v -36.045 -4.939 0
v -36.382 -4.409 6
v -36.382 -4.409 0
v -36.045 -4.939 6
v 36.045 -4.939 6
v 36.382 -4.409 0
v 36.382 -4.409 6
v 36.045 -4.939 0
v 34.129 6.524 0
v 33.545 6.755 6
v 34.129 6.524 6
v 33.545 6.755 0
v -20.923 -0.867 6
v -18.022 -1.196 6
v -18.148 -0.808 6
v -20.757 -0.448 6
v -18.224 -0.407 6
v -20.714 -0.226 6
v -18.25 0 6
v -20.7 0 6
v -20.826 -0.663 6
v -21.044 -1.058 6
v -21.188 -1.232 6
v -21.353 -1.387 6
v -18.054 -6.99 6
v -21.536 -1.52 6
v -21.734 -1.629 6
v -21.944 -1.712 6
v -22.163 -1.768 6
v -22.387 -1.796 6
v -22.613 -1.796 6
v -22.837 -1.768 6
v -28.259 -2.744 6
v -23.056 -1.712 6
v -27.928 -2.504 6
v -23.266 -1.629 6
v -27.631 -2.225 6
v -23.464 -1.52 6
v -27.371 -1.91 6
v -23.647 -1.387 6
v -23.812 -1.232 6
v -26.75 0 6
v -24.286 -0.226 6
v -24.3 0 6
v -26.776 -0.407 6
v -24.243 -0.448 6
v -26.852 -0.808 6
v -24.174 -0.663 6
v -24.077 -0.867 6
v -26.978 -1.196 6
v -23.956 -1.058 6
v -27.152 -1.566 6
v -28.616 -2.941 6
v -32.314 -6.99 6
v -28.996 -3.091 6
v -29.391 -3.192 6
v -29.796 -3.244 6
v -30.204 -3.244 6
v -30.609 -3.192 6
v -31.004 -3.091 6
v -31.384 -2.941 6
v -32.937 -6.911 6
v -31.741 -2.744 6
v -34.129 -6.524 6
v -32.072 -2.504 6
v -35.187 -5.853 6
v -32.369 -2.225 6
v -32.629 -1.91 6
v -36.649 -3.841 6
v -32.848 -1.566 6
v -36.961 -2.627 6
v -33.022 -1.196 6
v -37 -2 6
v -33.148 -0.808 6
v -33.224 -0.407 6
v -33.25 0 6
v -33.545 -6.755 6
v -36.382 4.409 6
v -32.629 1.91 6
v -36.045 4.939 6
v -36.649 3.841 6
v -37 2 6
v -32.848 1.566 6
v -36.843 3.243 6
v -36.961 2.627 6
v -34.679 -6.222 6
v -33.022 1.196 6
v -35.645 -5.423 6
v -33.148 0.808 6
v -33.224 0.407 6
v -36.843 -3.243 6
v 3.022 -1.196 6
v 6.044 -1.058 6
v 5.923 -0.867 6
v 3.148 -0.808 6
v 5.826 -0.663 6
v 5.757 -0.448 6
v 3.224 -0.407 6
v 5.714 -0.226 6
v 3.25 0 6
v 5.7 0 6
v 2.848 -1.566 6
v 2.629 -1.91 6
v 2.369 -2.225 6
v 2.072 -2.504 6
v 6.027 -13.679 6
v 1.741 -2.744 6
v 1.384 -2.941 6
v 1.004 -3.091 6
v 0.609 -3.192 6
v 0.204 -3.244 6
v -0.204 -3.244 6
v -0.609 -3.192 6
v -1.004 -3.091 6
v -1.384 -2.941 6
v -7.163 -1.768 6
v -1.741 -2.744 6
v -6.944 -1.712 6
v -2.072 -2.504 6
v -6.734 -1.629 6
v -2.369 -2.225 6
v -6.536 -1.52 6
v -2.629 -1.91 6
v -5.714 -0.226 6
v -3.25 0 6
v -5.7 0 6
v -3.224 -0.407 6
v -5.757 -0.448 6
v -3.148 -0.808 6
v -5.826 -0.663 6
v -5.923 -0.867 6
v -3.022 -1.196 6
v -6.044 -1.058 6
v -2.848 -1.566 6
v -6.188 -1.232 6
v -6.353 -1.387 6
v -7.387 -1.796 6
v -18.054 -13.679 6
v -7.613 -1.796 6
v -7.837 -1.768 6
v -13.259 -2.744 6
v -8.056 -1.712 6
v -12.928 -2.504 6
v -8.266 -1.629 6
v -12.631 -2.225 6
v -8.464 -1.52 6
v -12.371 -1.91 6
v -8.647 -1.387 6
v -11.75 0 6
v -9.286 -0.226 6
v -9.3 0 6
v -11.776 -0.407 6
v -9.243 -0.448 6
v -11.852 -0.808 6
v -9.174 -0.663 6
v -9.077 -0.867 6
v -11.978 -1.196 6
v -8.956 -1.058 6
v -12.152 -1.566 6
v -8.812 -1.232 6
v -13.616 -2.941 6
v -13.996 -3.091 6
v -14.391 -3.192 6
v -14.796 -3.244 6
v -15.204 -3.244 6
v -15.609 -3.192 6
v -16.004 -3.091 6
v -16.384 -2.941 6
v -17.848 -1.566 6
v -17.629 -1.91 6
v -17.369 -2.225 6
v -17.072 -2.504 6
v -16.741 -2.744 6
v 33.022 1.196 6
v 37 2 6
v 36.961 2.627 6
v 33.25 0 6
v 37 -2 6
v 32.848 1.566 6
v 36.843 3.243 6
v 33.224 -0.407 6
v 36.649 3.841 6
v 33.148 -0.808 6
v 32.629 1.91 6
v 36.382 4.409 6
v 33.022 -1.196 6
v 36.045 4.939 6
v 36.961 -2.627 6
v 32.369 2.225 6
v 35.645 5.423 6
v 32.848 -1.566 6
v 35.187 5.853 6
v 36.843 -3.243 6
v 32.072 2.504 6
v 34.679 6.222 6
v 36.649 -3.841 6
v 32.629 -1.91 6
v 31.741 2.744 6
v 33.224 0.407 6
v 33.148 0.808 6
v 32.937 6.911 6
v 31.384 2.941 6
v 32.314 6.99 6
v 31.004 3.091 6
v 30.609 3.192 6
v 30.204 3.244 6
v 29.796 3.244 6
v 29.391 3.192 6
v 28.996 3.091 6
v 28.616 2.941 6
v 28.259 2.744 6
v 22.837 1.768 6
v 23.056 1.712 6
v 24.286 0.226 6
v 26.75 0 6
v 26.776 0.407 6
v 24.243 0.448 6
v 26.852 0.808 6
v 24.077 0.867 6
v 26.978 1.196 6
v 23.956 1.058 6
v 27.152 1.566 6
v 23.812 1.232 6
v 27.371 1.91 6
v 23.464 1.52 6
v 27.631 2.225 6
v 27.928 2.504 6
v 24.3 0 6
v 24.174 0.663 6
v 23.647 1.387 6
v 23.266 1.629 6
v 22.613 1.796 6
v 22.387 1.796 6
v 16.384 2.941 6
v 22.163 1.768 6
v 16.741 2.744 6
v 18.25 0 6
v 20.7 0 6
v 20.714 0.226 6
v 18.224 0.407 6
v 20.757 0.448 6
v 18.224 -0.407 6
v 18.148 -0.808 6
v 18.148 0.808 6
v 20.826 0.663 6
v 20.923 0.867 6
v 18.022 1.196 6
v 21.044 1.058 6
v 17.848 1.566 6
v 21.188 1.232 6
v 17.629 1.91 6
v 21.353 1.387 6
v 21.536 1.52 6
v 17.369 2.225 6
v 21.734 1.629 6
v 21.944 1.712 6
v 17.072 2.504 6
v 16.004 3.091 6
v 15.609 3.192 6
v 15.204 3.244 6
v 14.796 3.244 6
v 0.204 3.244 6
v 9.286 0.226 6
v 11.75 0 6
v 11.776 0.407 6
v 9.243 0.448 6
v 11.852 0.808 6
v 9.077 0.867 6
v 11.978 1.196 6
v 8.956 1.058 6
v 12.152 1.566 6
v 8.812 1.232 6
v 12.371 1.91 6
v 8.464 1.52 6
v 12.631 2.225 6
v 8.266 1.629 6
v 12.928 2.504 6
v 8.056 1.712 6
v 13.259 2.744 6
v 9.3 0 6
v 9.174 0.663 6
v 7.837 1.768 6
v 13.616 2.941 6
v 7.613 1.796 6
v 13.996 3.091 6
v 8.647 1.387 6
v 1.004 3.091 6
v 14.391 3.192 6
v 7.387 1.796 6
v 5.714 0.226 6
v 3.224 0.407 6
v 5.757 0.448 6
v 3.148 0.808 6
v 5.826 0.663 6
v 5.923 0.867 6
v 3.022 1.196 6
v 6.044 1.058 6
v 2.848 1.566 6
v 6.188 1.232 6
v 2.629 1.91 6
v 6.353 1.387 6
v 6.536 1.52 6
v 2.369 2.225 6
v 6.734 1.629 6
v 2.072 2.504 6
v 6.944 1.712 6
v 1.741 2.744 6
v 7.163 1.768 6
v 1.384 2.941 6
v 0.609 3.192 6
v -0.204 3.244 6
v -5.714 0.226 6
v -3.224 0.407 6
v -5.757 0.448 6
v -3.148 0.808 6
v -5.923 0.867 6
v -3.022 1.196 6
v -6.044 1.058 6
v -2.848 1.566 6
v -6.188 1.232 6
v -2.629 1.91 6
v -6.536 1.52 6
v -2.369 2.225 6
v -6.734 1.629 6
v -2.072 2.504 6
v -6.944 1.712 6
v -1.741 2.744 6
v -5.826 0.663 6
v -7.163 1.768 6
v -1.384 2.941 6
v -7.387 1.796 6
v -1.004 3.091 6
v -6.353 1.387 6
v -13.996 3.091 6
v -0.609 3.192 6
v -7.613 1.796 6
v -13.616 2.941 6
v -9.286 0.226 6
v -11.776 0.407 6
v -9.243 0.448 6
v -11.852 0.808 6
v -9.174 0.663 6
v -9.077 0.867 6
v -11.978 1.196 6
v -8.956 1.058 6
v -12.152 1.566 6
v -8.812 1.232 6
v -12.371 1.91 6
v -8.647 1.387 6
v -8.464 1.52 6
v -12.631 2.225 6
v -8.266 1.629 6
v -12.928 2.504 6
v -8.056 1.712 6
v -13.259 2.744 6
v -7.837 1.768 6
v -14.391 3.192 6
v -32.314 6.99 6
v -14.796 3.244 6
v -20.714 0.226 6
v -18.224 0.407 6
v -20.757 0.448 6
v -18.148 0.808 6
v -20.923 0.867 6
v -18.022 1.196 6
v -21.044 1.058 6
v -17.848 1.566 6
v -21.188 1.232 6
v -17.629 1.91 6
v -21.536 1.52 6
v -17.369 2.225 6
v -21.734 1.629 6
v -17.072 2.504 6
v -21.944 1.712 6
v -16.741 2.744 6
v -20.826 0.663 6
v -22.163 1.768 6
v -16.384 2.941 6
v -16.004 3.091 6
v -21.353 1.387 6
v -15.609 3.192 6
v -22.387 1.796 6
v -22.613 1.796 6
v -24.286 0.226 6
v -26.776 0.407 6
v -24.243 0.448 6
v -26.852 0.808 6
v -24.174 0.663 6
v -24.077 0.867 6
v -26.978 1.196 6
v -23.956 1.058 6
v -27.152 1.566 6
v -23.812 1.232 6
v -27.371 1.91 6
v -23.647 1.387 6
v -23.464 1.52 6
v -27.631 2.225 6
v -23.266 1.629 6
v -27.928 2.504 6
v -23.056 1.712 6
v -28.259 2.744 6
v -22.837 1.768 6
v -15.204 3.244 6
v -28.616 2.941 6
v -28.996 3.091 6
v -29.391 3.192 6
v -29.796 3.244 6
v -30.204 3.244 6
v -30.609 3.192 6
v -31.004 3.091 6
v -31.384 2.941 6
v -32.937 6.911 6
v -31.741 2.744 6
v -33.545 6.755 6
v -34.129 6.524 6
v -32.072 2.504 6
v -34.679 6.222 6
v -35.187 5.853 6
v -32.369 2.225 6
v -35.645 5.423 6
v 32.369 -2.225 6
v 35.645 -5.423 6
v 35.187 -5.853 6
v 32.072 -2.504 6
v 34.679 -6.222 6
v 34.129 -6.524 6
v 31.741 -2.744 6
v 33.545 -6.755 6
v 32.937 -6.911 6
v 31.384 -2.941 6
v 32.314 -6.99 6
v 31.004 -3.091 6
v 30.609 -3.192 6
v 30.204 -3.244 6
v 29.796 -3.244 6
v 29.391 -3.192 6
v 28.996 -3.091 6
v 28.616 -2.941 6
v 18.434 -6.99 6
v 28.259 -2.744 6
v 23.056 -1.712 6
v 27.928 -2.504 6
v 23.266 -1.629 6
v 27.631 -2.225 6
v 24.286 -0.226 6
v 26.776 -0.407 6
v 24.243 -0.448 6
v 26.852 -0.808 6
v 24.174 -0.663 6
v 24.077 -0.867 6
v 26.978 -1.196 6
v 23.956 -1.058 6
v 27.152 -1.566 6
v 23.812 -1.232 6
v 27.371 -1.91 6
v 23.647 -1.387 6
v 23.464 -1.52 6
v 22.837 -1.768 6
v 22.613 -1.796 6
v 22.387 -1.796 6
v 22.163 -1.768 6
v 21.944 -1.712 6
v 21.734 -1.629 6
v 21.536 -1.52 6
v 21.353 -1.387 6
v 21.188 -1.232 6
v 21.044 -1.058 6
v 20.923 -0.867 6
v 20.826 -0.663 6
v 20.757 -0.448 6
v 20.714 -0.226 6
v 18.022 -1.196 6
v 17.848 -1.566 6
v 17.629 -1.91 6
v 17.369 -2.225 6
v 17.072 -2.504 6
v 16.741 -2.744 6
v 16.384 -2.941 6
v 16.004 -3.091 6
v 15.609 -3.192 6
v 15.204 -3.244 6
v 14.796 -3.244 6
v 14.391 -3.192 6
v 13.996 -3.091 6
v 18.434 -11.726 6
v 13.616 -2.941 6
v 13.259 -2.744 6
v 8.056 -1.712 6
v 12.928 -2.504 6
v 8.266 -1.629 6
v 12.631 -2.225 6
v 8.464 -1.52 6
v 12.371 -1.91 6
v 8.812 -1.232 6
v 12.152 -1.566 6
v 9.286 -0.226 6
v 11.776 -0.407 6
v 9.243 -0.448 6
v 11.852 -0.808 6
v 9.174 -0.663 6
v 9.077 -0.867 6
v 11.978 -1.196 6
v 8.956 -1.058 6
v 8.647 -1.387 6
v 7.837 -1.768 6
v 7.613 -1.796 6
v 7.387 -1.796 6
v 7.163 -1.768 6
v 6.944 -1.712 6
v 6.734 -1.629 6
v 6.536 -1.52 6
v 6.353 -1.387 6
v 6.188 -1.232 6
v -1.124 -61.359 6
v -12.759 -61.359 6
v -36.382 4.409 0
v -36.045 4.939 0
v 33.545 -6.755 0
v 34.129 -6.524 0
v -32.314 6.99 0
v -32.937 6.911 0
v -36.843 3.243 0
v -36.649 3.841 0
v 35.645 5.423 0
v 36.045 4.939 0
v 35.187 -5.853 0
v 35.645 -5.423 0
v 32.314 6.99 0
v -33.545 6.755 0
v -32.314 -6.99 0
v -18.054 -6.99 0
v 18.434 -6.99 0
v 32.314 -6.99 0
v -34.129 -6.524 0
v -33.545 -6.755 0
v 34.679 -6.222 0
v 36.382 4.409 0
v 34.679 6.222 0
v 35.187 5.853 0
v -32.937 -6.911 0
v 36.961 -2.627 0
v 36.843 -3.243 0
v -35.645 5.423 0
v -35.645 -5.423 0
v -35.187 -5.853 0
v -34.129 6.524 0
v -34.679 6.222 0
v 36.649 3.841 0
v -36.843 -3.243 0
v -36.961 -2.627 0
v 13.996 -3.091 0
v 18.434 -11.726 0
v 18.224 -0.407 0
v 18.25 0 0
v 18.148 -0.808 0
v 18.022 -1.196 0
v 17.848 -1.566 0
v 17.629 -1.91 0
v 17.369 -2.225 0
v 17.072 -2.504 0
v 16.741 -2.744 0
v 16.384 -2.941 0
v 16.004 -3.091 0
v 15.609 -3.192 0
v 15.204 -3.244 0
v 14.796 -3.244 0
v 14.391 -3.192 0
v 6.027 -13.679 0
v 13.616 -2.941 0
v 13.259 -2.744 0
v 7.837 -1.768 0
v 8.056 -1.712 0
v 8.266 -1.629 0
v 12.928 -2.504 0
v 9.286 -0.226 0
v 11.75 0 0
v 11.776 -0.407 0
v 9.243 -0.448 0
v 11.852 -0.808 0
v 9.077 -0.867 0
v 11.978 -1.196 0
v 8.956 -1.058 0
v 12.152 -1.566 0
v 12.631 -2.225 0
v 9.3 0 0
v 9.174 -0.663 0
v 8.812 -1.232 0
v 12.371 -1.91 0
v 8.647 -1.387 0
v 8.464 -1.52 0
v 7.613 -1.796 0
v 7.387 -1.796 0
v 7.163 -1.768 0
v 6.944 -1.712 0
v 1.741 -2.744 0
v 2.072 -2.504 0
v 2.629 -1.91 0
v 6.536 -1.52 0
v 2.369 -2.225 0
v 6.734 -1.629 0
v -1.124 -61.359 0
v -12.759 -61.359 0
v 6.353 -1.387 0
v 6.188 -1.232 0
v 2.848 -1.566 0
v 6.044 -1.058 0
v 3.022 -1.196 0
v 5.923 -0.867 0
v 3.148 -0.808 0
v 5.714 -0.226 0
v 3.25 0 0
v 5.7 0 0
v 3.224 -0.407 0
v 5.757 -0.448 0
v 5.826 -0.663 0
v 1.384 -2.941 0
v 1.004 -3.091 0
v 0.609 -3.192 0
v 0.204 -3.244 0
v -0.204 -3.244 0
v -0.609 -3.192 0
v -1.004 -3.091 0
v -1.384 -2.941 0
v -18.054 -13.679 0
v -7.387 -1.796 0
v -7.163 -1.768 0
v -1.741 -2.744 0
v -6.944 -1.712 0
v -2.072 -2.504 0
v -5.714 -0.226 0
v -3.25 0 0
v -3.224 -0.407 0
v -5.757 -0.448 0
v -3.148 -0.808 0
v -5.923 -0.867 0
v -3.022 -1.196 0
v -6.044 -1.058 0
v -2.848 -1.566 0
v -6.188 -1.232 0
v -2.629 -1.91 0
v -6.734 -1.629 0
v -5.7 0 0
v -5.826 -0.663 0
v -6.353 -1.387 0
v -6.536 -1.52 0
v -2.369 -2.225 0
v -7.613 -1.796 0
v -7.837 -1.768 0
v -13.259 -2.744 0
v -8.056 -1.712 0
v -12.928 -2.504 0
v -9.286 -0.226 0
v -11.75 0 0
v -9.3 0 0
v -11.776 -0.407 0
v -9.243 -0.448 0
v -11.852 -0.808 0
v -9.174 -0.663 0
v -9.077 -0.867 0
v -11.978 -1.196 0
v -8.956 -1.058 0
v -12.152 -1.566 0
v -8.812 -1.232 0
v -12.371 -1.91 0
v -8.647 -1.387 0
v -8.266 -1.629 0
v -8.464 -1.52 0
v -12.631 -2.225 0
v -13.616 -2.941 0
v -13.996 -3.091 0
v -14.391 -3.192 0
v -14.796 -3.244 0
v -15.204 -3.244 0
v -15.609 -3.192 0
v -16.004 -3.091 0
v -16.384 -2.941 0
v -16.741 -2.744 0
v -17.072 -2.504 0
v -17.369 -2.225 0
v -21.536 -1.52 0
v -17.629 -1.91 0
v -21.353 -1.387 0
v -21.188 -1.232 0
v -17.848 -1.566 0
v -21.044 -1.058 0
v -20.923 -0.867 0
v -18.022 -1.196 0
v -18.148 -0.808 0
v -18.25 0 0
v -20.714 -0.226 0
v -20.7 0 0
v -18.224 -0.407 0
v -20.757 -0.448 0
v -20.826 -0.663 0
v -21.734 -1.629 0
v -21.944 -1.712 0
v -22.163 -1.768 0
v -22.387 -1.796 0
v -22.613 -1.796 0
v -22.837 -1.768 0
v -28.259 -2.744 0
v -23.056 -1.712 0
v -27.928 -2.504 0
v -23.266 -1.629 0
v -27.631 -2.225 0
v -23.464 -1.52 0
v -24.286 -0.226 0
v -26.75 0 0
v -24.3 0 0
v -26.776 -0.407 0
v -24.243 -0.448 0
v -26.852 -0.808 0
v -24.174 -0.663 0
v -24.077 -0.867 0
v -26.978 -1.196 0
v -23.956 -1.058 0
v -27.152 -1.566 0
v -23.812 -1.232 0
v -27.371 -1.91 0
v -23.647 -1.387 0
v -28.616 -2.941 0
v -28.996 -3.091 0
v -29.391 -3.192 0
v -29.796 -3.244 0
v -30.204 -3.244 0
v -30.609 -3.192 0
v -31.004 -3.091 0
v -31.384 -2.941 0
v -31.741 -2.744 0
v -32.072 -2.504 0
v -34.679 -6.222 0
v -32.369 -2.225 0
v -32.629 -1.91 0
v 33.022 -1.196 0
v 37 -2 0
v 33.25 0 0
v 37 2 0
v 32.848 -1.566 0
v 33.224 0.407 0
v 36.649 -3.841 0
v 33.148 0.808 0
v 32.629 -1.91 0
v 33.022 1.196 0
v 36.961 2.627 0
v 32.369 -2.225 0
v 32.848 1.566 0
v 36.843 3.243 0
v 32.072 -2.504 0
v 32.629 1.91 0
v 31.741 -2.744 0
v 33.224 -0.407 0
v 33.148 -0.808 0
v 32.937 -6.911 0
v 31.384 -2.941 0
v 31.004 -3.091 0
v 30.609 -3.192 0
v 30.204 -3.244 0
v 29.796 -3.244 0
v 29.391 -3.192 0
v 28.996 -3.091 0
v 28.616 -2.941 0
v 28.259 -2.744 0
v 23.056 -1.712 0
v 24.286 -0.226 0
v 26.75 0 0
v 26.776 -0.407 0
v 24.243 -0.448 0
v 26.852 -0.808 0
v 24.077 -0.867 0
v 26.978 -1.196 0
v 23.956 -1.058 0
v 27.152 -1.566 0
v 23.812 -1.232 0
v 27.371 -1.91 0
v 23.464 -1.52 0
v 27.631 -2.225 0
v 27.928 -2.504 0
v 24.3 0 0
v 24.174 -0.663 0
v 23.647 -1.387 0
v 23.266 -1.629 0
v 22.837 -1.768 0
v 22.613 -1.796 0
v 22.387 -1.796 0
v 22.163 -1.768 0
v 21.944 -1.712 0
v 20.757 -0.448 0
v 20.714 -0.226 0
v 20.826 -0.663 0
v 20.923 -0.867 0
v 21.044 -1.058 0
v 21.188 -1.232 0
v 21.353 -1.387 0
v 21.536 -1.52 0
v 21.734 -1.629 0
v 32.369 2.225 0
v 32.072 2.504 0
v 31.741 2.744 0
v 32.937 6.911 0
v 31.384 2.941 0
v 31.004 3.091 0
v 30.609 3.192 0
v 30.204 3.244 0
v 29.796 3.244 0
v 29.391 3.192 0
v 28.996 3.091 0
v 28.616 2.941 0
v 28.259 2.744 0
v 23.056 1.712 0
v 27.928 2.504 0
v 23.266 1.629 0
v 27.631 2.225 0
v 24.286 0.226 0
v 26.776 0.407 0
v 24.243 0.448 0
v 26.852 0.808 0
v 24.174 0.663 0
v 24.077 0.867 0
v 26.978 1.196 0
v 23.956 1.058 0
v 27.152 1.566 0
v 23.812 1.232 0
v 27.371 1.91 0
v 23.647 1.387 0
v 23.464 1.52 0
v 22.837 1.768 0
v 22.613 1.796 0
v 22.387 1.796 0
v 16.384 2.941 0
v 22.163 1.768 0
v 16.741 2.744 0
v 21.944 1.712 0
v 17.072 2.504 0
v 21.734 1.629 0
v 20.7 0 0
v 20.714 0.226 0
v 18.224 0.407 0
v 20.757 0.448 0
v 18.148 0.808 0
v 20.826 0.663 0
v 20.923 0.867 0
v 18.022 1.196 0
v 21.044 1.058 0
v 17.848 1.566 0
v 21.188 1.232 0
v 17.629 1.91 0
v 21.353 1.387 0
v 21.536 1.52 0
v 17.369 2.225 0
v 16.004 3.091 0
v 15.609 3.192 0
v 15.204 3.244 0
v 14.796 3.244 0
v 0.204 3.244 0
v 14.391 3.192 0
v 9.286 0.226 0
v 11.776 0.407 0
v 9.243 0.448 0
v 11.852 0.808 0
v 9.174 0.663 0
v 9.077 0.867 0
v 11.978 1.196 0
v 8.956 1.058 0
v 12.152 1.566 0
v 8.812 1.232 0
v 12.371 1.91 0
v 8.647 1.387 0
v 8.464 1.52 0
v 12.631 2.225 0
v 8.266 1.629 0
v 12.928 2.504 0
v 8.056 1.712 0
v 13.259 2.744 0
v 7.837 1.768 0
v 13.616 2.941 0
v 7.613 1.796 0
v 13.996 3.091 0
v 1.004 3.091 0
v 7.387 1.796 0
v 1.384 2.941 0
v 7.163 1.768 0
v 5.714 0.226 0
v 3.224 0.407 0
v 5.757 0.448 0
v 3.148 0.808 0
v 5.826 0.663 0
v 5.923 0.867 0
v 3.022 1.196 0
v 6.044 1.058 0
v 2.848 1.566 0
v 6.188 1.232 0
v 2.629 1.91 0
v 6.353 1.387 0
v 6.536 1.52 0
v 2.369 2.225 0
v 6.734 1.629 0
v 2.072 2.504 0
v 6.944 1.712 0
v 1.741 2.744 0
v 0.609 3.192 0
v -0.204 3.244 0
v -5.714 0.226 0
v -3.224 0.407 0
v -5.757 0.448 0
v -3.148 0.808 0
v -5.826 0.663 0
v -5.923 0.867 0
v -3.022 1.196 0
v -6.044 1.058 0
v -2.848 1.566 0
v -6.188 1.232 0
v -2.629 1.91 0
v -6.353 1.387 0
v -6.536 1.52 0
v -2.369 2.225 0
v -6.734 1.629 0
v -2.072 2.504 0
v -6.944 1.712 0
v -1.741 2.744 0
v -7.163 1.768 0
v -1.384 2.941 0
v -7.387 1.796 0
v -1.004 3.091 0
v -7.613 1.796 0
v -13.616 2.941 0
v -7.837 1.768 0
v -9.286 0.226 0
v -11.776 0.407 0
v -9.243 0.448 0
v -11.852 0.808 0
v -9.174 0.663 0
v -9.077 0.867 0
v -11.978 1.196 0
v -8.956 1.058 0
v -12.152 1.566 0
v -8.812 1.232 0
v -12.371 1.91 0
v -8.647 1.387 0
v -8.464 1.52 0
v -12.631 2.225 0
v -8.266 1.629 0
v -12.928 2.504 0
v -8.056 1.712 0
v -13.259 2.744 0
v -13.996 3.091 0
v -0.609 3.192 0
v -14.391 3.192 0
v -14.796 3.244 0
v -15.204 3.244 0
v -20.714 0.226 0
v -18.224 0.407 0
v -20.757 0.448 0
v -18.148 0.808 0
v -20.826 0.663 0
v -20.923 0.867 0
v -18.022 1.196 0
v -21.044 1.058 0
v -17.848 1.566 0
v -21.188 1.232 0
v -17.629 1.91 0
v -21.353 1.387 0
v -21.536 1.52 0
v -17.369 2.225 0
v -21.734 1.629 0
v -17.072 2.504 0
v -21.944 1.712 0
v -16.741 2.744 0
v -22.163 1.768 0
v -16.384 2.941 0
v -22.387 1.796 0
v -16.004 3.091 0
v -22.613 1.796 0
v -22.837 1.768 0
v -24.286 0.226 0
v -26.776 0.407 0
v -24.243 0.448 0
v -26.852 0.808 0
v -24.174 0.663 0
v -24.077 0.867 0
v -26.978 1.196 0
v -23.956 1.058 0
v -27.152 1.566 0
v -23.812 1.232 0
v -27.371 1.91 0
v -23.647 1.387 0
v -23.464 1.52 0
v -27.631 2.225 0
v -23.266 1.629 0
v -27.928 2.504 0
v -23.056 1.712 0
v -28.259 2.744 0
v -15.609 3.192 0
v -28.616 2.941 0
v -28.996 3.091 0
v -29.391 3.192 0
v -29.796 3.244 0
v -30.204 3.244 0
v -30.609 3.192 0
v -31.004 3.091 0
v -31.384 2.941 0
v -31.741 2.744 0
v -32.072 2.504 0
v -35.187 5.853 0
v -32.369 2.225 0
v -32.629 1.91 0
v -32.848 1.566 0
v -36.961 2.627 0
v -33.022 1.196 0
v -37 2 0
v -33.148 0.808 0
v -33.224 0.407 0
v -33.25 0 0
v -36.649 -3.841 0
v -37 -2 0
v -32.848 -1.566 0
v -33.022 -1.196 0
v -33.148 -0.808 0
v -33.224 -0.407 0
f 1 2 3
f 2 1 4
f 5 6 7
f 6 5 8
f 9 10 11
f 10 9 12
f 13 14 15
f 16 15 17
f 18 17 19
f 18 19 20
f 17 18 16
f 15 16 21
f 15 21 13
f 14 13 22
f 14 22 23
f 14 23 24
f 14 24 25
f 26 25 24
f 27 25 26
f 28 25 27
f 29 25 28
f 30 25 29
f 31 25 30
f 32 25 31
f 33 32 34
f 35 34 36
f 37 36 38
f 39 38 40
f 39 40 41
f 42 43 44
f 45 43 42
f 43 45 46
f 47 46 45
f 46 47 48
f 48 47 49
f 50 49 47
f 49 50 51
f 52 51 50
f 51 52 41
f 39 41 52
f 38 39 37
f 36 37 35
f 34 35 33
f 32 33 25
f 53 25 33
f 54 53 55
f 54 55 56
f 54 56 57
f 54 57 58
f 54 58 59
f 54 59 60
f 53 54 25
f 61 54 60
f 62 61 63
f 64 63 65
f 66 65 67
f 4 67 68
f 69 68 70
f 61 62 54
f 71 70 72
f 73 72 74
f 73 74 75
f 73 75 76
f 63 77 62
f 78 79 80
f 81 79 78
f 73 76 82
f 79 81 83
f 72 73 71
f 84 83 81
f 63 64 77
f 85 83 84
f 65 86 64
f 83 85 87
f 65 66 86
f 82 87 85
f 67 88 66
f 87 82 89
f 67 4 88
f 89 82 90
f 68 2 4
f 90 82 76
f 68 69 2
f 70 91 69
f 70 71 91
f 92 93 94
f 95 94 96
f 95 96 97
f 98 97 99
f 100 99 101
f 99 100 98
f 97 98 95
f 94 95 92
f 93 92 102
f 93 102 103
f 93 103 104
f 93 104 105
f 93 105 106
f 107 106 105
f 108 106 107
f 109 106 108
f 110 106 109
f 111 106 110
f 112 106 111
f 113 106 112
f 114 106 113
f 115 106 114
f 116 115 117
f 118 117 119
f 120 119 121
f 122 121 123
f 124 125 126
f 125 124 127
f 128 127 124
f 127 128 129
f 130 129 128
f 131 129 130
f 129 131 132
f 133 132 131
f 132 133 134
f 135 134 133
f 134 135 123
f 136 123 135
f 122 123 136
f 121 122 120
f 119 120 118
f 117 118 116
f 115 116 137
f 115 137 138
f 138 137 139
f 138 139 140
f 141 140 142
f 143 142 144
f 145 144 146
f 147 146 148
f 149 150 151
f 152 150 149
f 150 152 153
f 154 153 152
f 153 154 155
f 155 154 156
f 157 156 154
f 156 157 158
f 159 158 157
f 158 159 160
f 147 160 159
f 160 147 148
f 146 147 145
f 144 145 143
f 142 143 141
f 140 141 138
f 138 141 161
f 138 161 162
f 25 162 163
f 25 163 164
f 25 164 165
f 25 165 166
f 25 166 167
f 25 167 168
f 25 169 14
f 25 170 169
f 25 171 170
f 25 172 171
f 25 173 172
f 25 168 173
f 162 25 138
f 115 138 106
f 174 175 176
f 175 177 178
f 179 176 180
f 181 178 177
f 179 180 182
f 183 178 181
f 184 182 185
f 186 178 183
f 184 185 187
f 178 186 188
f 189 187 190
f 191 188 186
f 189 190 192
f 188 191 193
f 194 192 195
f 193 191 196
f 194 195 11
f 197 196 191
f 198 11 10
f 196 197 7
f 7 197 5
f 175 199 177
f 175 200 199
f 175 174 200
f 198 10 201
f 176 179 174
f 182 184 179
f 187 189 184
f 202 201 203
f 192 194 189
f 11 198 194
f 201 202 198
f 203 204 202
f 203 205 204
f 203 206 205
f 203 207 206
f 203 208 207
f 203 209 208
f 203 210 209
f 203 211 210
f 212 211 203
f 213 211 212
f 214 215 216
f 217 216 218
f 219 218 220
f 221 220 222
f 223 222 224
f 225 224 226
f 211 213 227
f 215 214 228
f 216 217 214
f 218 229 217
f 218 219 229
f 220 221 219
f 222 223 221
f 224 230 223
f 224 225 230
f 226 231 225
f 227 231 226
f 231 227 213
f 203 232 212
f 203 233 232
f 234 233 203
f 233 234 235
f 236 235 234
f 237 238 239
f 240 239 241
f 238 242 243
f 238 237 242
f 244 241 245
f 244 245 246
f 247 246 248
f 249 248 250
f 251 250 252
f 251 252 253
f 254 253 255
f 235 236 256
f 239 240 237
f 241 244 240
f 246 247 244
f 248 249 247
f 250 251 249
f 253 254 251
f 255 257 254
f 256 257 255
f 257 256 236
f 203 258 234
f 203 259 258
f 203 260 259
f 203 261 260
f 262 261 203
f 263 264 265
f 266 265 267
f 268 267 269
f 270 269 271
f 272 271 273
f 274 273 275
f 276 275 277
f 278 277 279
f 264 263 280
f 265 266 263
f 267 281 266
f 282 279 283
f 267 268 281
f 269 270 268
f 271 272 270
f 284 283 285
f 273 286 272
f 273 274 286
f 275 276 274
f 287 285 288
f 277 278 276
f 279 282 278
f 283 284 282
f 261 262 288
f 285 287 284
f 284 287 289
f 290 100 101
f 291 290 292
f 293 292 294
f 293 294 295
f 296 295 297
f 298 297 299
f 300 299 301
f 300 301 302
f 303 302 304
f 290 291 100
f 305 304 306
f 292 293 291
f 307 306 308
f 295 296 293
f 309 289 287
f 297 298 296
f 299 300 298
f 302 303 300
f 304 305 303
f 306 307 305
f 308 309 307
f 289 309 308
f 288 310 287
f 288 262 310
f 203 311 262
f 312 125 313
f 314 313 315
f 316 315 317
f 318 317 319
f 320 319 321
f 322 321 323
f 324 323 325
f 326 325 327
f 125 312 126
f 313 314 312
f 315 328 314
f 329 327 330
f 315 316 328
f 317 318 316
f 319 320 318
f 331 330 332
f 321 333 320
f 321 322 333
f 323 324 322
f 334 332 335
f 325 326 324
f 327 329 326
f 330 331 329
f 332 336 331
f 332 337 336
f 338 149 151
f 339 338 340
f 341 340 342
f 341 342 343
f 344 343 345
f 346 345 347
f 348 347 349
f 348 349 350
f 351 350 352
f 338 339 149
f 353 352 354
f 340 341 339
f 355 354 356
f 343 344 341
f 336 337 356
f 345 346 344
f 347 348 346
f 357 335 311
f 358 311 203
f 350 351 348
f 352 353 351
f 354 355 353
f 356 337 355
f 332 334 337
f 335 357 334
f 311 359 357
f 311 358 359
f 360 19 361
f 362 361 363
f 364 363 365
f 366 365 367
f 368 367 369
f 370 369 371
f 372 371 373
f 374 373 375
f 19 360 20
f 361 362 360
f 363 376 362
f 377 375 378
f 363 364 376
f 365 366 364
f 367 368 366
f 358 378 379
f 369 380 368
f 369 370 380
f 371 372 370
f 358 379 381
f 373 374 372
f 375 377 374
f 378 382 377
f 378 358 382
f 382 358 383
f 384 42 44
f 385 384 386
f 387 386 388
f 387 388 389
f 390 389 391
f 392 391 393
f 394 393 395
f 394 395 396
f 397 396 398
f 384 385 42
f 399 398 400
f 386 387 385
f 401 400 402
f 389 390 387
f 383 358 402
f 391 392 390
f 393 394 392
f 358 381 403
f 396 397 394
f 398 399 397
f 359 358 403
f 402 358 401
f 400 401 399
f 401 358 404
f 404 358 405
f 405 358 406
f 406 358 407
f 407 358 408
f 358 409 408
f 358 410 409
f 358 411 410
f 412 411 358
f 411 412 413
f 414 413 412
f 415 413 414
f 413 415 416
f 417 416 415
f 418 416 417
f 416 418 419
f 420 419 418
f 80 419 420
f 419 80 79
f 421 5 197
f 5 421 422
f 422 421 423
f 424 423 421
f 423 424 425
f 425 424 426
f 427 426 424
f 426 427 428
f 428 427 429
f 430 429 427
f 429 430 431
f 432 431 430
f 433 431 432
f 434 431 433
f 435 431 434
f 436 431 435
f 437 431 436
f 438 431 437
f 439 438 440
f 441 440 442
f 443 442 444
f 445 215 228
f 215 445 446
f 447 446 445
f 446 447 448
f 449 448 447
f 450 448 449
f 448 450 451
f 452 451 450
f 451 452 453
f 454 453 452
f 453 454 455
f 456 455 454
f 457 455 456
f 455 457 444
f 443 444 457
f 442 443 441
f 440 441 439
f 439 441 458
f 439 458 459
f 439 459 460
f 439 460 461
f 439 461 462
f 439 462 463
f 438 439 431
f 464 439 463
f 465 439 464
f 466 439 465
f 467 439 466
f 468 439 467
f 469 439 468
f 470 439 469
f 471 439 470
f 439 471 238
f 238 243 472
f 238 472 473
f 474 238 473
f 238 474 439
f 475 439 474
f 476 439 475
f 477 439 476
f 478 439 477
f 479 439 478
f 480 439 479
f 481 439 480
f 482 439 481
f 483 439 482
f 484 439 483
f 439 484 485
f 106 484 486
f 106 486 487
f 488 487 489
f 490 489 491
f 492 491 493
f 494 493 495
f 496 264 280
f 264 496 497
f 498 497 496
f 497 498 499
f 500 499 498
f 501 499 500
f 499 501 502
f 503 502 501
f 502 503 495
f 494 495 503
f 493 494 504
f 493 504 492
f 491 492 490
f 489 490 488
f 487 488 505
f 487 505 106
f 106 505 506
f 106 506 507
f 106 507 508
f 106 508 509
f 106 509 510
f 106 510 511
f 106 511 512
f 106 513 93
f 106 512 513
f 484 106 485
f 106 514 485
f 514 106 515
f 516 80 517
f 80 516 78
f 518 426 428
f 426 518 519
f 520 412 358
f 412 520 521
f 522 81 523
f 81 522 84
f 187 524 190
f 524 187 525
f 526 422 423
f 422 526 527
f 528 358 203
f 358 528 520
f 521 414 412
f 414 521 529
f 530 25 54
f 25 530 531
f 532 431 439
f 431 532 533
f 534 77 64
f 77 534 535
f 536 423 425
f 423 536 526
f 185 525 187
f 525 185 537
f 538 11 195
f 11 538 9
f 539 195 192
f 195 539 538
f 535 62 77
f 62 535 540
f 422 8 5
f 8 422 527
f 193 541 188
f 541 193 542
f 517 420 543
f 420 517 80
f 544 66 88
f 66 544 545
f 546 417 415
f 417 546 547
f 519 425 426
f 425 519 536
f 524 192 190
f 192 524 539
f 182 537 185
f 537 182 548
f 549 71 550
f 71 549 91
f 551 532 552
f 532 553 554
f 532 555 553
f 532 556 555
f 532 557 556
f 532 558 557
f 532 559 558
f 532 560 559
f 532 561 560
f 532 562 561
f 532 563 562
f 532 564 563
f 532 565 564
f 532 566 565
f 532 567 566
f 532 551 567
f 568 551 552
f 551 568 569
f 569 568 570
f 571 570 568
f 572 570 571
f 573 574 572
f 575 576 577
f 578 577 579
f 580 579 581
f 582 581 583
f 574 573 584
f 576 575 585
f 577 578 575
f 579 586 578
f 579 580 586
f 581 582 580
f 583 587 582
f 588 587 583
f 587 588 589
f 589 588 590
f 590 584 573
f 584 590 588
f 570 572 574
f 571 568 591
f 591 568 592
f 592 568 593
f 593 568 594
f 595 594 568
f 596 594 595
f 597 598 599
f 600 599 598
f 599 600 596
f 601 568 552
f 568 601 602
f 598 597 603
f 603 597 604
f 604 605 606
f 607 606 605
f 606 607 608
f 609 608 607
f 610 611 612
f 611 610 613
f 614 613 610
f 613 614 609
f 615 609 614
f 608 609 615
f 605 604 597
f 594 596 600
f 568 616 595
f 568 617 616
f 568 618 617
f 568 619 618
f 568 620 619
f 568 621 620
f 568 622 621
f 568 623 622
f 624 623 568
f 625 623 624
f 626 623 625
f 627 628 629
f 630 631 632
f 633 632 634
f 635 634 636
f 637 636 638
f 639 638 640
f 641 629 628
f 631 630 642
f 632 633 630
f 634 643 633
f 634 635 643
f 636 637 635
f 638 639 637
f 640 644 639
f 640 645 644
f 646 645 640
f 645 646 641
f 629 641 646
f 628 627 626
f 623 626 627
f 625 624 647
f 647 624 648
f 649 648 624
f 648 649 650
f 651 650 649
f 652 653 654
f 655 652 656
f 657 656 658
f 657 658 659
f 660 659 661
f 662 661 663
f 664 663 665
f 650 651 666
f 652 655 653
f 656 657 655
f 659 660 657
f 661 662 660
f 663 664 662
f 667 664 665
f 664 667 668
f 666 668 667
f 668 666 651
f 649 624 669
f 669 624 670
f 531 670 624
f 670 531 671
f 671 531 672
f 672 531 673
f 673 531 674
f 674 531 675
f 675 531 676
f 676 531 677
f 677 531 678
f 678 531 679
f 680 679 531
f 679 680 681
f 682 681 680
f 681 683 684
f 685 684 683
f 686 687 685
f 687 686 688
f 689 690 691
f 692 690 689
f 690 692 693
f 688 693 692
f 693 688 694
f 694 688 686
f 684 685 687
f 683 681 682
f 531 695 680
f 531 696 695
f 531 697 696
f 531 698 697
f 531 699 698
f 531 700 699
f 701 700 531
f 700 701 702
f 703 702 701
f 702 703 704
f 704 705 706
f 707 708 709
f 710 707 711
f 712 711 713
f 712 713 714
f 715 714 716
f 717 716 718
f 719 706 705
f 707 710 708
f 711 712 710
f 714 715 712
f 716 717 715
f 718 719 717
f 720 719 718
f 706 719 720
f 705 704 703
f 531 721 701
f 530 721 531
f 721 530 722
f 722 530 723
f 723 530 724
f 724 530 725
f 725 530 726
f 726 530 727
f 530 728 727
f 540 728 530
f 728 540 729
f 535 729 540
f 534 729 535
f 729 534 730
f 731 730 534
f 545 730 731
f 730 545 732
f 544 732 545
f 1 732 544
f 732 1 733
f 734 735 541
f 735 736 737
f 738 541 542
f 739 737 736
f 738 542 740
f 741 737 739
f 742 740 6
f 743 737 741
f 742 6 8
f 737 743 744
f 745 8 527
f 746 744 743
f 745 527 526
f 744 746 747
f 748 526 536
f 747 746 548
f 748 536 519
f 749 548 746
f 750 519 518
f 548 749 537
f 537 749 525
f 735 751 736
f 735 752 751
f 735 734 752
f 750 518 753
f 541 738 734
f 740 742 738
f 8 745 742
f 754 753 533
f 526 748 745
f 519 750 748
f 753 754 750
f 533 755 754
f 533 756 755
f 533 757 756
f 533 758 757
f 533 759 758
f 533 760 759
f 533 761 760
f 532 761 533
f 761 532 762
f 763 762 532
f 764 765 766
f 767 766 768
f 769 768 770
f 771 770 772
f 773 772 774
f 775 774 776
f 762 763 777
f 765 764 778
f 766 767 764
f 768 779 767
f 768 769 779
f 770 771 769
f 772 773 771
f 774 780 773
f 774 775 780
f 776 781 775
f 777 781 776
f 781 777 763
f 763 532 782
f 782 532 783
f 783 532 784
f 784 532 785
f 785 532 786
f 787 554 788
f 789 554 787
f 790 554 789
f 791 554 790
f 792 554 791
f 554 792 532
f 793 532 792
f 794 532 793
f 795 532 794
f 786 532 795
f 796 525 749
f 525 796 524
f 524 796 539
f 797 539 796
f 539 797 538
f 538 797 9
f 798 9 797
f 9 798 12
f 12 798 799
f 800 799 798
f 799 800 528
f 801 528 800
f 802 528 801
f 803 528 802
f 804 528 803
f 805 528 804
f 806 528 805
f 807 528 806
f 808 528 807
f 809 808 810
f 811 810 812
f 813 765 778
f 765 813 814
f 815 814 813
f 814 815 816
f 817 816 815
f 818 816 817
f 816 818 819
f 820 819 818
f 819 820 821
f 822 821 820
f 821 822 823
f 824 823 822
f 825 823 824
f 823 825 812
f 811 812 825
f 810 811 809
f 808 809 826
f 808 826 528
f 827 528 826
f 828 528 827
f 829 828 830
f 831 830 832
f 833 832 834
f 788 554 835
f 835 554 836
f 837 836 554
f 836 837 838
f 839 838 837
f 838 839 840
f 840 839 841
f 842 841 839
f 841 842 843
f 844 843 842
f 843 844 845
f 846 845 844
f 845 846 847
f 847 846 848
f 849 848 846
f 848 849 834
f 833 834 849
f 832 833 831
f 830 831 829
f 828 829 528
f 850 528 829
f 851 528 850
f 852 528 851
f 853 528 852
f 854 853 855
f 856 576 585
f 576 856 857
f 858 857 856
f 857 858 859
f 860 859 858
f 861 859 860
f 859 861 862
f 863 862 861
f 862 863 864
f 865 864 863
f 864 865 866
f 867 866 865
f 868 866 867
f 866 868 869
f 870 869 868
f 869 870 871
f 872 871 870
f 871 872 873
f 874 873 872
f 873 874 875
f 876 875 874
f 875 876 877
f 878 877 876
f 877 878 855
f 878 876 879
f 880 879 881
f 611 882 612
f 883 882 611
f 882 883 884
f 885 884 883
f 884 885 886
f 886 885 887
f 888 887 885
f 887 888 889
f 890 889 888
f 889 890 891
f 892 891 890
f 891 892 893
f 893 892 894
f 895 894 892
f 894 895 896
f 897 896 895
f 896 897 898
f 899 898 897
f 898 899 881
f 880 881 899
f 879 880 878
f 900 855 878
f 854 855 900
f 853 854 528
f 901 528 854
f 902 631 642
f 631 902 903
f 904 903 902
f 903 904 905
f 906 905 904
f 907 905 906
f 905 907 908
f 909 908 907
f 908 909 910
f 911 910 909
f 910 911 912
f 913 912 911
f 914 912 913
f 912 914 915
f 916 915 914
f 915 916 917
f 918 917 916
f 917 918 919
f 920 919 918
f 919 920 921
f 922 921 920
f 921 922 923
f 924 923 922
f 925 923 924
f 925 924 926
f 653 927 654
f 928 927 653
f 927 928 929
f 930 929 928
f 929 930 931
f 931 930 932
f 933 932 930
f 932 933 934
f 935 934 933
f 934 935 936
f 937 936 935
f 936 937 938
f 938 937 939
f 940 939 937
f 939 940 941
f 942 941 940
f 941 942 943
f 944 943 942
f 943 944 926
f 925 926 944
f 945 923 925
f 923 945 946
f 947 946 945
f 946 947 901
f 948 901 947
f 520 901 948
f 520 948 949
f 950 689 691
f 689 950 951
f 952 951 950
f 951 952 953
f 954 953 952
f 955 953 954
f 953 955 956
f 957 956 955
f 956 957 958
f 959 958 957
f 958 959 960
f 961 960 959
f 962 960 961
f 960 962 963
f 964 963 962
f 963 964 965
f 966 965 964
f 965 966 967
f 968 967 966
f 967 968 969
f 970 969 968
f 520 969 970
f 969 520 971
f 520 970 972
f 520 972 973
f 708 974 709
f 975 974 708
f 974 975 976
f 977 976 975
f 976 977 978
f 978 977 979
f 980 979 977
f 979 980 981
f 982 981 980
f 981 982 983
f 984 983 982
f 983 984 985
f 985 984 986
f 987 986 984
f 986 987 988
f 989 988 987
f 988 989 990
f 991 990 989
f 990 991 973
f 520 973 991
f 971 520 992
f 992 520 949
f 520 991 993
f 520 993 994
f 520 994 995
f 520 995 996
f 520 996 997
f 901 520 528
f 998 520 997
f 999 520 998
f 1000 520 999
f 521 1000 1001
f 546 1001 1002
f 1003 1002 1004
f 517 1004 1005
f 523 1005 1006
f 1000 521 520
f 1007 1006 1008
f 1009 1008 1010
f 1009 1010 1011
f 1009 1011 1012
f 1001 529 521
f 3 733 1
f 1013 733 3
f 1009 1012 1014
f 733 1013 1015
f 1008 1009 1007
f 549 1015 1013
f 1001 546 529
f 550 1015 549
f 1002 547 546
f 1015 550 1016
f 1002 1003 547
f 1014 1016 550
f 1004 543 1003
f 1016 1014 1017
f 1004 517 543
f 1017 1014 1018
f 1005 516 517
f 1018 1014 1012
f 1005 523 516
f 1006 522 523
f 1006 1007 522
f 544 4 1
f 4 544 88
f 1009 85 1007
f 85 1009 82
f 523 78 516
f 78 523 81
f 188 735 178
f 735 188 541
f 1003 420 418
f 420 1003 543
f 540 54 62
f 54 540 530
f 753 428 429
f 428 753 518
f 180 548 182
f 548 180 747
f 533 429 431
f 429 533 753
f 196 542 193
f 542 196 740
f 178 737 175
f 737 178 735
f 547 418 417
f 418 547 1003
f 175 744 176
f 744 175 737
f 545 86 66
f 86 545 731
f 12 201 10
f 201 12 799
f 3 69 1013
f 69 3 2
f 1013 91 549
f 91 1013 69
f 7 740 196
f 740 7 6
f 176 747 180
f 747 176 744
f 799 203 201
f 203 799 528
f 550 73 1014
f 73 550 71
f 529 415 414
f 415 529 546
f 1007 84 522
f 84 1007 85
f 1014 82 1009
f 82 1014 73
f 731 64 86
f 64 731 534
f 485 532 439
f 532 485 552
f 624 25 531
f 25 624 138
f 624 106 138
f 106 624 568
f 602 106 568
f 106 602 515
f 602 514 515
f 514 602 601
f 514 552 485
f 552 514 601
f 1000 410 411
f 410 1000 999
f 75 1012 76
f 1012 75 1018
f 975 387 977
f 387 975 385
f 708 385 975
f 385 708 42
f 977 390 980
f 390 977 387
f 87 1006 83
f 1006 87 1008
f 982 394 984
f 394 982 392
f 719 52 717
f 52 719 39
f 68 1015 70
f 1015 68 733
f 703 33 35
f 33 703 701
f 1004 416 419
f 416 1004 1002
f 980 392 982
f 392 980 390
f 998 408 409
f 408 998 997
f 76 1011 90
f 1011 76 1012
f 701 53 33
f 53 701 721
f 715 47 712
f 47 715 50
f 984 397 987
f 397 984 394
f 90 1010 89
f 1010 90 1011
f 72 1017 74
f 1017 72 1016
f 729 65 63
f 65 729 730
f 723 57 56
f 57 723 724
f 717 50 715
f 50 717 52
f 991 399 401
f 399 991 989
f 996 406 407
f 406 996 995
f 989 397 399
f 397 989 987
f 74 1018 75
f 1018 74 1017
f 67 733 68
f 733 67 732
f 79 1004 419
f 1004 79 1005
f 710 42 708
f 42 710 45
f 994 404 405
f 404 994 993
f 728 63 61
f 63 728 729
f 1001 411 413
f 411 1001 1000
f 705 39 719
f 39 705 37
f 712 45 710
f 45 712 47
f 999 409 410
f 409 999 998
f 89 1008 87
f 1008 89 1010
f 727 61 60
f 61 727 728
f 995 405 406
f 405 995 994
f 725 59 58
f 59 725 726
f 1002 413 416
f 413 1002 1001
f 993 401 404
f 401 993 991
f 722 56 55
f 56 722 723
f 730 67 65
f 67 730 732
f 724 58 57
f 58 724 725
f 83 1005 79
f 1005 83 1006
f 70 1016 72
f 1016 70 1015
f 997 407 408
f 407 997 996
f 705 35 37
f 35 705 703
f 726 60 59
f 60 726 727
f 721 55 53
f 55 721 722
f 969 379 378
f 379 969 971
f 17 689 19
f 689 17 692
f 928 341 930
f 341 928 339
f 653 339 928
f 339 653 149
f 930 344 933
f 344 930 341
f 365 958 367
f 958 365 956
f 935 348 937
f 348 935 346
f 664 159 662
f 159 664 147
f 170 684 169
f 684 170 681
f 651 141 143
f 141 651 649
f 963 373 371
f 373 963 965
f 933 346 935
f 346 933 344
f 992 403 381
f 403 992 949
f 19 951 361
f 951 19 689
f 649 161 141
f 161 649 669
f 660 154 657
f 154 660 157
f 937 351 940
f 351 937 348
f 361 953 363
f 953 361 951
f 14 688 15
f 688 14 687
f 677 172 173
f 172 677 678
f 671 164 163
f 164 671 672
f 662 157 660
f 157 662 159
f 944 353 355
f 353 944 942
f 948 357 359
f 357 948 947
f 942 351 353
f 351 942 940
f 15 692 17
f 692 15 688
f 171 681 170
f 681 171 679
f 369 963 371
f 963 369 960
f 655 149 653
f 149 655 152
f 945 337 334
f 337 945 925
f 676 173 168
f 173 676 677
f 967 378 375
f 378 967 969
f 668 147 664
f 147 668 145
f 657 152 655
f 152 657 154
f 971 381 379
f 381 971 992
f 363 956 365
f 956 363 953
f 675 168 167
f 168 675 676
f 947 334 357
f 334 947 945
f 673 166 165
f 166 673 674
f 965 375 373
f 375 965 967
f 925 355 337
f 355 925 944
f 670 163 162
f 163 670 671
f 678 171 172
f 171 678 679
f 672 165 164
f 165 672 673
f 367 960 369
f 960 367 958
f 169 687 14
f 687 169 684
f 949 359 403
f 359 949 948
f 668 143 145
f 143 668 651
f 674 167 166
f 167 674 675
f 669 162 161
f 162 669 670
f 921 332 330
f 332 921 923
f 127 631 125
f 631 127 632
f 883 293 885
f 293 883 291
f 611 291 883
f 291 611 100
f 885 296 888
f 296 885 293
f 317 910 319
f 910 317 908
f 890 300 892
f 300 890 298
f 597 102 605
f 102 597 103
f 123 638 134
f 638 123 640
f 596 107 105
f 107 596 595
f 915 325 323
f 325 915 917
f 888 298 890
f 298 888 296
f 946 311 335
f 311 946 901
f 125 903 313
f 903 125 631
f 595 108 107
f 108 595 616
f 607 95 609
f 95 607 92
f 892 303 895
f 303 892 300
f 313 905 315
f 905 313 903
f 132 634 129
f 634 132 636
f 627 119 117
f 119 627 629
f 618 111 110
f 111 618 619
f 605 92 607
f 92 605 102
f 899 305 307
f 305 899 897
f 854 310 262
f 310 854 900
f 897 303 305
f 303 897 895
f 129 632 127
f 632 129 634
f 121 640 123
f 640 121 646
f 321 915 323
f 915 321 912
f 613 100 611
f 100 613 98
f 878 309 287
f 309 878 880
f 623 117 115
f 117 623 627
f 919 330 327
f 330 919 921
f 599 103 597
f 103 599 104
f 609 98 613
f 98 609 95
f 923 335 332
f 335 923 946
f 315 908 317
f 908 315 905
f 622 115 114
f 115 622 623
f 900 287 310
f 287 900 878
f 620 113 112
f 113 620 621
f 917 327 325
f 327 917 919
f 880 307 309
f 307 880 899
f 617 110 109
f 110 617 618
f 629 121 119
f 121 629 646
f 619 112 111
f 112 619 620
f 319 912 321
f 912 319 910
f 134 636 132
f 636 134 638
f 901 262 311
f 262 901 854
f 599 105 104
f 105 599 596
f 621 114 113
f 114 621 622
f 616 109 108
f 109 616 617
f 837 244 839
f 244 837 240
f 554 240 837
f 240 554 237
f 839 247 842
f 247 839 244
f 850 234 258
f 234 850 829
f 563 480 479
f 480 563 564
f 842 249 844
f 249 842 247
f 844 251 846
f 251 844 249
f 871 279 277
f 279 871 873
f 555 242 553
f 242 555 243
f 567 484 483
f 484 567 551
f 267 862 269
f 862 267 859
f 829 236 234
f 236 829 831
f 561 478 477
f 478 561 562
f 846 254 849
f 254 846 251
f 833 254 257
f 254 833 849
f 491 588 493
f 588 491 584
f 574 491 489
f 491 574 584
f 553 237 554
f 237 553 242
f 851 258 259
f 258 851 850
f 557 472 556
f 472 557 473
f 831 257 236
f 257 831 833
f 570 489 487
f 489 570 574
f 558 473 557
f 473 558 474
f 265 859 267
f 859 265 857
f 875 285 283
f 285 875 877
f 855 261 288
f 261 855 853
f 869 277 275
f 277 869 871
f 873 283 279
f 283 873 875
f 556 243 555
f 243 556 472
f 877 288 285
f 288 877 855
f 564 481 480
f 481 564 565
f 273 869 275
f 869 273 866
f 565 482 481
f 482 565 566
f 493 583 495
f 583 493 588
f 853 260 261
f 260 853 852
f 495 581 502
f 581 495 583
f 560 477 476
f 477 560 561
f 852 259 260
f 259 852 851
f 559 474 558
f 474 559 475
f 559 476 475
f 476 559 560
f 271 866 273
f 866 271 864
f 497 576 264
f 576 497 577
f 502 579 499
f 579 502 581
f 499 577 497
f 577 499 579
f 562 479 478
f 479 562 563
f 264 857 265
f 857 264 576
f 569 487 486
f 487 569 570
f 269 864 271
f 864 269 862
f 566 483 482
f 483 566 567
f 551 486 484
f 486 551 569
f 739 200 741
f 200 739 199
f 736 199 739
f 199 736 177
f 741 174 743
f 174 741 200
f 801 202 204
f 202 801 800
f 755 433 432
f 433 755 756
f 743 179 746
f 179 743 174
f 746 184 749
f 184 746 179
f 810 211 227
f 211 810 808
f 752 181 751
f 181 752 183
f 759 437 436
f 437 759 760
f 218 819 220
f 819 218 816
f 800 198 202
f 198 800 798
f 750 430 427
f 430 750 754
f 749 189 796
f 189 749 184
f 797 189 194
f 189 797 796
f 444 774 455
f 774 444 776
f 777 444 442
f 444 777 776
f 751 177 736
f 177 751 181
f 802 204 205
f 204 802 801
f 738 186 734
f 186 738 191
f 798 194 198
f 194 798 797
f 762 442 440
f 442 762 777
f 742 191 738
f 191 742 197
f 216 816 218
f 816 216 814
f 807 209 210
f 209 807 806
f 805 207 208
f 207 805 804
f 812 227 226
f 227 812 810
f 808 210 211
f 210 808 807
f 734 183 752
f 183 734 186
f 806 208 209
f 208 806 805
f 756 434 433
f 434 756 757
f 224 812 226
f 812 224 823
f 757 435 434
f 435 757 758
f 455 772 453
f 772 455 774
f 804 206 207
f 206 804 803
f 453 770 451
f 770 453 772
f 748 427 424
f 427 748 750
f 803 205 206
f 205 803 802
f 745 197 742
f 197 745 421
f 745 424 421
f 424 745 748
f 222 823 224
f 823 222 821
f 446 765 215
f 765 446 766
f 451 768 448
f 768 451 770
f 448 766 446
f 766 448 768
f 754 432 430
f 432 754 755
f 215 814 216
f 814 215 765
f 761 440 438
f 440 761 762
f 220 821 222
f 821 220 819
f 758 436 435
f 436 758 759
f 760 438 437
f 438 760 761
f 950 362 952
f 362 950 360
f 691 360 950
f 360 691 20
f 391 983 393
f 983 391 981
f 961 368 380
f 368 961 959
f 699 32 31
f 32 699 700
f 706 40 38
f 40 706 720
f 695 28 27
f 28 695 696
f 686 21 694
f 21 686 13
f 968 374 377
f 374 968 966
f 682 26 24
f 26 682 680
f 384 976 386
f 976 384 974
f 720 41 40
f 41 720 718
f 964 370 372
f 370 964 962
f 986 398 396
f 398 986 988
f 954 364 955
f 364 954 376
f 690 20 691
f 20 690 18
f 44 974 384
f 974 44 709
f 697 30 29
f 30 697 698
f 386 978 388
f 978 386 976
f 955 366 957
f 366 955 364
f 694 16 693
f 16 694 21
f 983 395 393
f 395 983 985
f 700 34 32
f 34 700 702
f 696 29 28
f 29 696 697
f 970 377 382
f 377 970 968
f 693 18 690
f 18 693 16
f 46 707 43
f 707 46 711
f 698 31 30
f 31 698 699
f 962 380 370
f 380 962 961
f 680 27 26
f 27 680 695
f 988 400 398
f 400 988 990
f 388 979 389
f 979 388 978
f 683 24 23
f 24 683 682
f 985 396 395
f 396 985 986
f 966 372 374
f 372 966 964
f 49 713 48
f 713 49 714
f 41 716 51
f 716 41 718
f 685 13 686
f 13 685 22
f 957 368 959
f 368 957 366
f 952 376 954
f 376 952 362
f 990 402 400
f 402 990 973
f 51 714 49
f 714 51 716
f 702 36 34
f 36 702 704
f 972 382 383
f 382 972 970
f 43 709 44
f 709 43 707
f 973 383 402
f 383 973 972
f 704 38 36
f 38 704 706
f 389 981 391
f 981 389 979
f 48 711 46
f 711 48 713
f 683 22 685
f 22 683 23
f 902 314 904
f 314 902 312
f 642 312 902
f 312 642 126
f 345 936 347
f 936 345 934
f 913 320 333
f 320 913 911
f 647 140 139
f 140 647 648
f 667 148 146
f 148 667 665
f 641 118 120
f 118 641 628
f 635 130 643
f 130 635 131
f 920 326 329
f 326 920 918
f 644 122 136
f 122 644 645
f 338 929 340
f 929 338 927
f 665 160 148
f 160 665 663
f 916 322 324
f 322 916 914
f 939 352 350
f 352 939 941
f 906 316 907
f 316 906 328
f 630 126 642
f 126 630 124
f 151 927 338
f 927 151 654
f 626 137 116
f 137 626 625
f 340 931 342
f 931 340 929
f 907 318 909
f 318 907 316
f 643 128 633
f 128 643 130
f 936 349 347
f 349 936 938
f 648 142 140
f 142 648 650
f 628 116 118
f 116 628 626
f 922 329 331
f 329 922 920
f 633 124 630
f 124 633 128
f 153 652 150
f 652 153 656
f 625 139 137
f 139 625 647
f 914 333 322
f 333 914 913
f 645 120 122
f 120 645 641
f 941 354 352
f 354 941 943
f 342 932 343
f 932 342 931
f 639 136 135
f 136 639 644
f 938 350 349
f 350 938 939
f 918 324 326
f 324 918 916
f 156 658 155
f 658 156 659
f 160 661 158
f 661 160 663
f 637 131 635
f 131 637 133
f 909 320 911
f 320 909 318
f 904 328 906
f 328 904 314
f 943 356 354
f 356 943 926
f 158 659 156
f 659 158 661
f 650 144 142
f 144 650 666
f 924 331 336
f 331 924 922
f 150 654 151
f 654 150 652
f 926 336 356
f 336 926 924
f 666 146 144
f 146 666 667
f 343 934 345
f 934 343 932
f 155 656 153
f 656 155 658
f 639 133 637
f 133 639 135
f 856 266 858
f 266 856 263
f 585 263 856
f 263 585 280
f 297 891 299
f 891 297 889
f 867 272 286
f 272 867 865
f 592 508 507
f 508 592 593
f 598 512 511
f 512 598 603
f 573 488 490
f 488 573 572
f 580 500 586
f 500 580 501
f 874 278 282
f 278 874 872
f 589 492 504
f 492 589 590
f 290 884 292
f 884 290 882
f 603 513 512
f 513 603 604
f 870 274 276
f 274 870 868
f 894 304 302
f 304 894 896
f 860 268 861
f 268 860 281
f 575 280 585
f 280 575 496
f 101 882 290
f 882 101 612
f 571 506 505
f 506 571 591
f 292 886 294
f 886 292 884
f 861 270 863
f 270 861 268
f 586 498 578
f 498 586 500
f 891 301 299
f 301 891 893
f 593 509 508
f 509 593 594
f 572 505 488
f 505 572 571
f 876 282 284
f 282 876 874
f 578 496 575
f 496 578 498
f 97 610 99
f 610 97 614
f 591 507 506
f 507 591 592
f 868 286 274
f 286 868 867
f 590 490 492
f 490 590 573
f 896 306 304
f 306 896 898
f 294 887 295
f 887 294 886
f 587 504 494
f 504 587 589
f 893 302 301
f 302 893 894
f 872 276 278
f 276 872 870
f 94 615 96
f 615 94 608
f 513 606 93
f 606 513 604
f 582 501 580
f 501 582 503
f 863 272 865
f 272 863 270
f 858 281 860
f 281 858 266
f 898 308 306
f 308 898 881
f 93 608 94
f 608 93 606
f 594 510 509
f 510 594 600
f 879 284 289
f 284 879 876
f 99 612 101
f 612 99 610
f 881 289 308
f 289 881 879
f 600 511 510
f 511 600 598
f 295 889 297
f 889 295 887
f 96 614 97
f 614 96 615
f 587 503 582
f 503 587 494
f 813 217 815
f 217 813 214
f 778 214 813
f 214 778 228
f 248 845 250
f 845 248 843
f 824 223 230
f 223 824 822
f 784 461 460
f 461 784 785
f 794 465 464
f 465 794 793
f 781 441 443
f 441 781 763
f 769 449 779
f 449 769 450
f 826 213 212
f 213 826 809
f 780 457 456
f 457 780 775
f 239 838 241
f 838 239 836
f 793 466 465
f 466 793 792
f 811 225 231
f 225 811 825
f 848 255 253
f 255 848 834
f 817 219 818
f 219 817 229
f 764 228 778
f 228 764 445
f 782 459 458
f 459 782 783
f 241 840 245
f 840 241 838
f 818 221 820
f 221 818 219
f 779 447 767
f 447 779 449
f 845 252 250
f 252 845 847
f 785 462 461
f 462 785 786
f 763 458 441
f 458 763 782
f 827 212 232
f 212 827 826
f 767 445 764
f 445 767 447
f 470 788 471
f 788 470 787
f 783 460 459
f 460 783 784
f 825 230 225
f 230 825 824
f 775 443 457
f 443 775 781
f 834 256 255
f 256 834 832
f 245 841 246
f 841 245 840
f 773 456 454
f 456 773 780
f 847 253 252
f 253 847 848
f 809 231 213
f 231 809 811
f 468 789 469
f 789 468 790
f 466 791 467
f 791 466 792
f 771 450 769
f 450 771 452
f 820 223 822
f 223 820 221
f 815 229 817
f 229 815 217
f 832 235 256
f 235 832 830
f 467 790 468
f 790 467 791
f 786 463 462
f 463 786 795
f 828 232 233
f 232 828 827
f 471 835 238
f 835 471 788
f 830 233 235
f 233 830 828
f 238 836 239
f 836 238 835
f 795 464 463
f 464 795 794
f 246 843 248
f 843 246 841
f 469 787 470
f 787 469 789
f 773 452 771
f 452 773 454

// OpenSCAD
$fn = 50;


difference() {
	union() {
		hull() {
			translate(v = [-32.0000000000, 2.0000000000, 0]) {
				cylinder(h = 6, r = 5);
			}
			translate(v = [32.0000000000, 2.0000000000, 0]) {
				cylinder(h = 6, r = 5);
			}
			translate(v = [-32.0000000000, -2.0000000000, 0]) {
				cylinder(h = 6, r = 5);
			}
			translate(v = [32.0000000000, -2.0000000000, 0]) {
				cylinder(h = 6, r = 5);
			}
		}
		translate(v = [0, -5, 0]) {
			linear_extrude(height = 6) {
				text(font = "DejaVu Sans Mono:style=Bold", halign = "center", size = 57.0000000000, text = "7", valign = "top");
			}
		}
	}
	union() {
		translate(v = [-30.0000000000, 0.0000000000, 0]) {
			translate(v = [0, 0, -100]) {
				cylinder(h = 200, r = 3.2500000000);
			}
		}
		translate(v = [-15.0000000000, 0.0000000000, 0]) {
			translate(v = [0, 0, -100]) {
				cylinder(h = 200, r = 3.2500000000);
			}
		}
		translate(v = [0, 0, -100]) {
			cylinder(h = 200, r = 3.2500000000);
		}
		translate(v = [15.0000000000, 0.0000000000, 0]) {
			translate(v = [0, 0, -100]) {
				cylinder(h = 200, r = 3.2500000000);
			}
		}
		translate(v = [30.0000000000, 0.0000000000, 0]) {
			translate(v = [0, 0, -100]) {
				cylinder(h = 200, r = 3.2500000000);
			}
		}
		translate(v = [-30.0000000000, 0.0000000000, 0]) {
			translate(v = [0, 0, -100]) {
				cylinder(h = 200, r = 1.8000000000);
			}
		}
		translate(v = [-22.5000000000, 0.0000000000, 0]) {
			translate(v = [0, 0, -100]) {
				cylinder(h = 200, r = 1.8000000000);
			}
		}
		translate(v = [-15.0000000000, 0.0000000000, 0]) {
			translate(v = [0, 0, -100]) {
				cylinder(h = 200, r = 1.8000000000);
			}
		}
		translate(v = [-7.5000000000, 0.0000000000, 0]) {
			translate(v = [0, 0, -100]) {
				cylinder(h = 200, r = 1.8000000000);
			}
		}
		translate(v = [0, 0, -100]) {
			cylinder(h = 200, r = 1.8000000000);
		}
		translate(v = [7.5000000000, 0.0000000000, 0]) {
			translate(v = [0, 0, -100]) {
				cylinder(h = 200, r = 1.8000000000);
			}
		}
		translate(v = [15.0000000000, 0.0000000000, 0]) {
			translate(v = [0, 0, -100]) {
				cylinder(h = 200, r = 1.8000000000);
			}
		}
		translate(v = [22.5000000000, 0.0000000000, 0]) {
			translate(v = [0, 0, -100]) {
				cylinder(h = 200, r = 1.8000000000);
			}
		}
		translate(v = [30.0000000000, 0.0000000000, 0]) {
			translate(v = [0, 0, -100]) {
				cylinder(h = 200, r = 1.8000000000);
			}
		}
	}
}
